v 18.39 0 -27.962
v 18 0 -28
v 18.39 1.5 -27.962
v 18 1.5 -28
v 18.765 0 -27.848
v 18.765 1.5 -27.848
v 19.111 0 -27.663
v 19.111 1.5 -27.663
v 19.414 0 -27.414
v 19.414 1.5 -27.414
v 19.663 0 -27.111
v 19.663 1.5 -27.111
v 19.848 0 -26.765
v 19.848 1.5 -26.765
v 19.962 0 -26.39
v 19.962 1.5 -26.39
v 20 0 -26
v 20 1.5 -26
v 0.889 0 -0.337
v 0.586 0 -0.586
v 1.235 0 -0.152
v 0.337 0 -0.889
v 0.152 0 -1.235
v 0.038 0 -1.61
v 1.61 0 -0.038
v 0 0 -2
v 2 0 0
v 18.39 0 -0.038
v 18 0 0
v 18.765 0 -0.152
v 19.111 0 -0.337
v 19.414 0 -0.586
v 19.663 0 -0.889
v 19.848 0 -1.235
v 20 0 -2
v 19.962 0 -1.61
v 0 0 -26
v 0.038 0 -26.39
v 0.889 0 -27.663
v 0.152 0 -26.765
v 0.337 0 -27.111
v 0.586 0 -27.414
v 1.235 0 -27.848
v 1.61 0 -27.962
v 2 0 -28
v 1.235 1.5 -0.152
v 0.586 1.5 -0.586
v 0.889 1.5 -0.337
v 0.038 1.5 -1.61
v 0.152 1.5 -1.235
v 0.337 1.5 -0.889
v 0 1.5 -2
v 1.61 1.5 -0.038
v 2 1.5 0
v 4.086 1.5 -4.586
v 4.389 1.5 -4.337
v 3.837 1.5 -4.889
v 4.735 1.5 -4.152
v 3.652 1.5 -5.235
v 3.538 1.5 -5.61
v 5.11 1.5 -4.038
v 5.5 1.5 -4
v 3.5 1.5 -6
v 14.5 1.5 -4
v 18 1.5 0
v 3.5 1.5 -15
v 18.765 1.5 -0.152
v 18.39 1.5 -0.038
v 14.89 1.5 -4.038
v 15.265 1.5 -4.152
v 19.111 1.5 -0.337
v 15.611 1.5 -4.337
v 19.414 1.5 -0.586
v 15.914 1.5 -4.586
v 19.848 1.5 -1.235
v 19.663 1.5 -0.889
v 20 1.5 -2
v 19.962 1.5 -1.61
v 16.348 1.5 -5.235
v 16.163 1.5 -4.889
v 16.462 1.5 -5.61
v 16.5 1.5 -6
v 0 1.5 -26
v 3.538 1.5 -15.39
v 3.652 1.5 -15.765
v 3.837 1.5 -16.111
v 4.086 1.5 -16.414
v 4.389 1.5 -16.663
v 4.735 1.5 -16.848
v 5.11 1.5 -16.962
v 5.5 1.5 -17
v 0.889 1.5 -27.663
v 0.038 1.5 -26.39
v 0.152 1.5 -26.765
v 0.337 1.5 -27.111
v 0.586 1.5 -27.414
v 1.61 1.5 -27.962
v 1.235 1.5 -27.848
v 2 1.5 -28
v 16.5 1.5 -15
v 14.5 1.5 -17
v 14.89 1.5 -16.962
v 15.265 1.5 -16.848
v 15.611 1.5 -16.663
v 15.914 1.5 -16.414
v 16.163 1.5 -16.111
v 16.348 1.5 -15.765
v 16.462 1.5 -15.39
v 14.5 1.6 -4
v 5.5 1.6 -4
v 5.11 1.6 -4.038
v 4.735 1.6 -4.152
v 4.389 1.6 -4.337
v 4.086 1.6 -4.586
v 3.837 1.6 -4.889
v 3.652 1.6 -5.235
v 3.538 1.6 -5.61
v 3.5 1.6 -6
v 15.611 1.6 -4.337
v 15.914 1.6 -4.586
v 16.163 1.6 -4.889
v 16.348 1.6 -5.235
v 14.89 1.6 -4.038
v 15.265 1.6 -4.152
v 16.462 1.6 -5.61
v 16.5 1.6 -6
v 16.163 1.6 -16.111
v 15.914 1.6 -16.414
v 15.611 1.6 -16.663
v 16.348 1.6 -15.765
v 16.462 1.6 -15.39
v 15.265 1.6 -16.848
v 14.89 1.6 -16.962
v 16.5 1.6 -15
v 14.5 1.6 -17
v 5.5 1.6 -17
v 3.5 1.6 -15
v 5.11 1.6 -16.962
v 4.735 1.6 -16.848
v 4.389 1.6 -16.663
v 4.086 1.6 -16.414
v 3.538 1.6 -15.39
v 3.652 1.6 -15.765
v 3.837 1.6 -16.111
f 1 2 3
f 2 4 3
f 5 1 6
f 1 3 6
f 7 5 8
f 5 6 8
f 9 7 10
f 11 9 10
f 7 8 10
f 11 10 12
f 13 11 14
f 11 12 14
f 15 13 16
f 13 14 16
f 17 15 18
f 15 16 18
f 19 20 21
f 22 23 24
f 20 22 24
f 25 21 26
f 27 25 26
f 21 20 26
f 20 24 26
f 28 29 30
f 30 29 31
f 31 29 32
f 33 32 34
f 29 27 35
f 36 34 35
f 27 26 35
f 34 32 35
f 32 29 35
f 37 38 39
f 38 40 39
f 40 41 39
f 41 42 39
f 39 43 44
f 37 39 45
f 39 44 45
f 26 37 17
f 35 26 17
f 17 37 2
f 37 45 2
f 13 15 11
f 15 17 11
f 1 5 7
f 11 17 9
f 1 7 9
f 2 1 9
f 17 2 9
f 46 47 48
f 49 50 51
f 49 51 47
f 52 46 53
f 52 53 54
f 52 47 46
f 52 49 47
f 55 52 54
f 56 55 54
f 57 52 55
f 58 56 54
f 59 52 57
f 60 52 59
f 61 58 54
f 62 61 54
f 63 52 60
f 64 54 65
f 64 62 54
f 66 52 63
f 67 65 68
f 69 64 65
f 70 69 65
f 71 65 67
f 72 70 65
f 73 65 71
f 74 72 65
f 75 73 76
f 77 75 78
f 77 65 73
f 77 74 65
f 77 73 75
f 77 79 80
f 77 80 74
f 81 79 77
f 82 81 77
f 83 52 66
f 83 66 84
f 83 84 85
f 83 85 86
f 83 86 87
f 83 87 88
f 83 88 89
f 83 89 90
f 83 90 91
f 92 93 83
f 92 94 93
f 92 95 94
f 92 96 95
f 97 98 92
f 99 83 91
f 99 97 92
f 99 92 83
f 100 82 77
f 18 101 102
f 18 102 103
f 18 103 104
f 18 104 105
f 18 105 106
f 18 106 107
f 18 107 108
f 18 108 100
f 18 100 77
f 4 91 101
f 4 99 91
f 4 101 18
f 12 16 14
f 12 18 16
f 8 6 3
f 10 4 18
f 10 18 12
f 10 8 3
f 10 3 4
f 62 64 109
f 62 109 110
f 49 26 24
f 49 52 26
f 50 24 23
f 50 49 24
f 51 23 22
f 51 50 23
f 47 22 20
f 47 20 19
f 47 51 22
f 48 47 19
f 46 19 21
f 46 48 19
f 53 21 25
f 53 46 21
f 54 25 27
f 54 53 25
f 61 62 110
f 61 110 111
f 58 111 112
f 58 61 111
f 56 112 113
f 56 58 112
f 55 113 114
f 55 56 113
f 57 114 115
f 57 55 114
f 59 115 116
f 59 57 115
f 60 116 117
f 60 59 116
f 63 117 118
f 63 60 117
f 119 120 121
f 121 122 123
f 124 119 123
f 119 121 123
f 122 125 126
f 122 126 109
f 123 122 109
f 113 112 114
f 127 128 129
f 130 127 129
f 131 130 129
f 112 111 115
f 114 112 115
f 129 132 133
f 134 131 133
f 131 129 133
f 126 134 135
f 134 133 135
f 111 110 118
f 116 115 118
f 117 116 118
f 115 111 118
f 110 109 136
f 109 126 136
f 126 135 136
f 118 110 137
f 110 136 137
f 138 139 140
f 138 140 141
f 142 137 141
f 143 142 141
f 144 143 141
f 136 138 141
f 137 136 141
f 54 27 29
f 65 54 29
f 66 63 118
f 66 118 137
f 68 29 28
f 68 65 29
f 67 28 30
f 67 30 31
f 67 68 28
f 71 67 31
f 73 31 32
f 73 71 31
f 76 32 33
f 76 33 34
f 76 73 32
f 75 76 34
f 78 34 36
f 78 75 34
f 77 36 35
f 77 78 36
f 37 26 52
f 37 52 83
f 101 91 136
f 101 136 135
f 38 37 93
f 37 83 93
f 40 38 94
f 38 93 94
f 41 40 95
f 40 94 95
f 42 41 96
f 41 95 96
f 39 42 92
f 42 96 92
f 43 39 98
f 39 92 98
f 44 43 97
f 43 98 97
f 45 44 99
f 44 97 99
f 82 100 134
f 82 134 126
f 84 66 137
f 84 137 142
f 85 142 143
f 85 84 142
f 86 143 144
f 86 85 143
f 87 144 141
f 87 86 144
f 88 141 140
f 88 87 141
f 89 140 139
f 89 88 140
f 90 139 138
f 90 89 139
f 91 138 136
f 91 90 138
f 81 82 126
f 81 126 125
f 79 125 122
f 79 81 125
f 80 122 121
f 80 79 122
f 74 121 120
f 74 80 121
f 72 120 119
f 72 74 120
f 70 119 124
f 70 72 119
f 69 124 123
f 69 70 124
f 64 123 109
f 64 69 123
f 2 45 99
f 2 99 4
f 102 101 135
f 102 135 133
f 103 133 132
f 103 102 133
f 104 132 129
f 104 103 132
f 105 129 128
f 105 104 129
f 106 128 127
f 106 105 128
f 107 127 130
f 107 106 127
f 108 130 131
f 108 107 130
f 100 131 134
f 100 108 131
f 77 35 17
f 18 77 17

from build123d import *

# Parameters (mm, degrees)
SKETCH1_W           = 20
SKETCH1_H           = 28
BOSS_EXTRUDE1_DEPTH = 1.5
BOSS_EXTRUDE2_DEPTH = 0.1
FILLET1_R           = 2


with BuildPart() as part:
    # Sketch1 → Boss-Extrude1 (new body)
    with BuildSketch(Plane(origin=(0, 0, 0), x_dir=(1, 0, 0), z_dir=(0, 1, 0))):
        with Locations((10, 14)):
            Rectangle(SKETCH1_W, SKETCH1_H)
    extrude(amount=BOSS_EXTRUDE1_DEPTH)

    # Sketch2 → Boss-Extrude2 (add)
    with BuildSketch(Plane(origin=(0, 1.5, 0), x_dir=(1, 0, 0), z_dir=(0, 1, 0))):
        with BuildLine():
            Line((5.5, 17), (14.5, 17))
            ThreePointArc((14.5, 17), (15.914213562, 16.414213562), (16.5, 15))
            Line((16.5, 15), (16.5, 6))
            ThreePointArc((16.5, 6), (15.914213562, 4.585786438), (14.5, 4))
            Line((14.5, 4), (5.5, 4))
            ThreePointArc((5.5, 4), (4.085786438, 4.585786438), (3.5, 6))
            Line((3.5, 6), (3.5, 15))
            ThreePointArc((3.5, 15), (4.085786438, 16.414213562), (5.5, 17))
        make_face()
    extrude(amount=BOSS_EXTRUDE2_DEPTH)

    # Fillet1
    fillet1_edges = [part.edges().sort_by_distance(p)[0] for p in [
        (0, 0.75, -28),
        (20, 0.75, -28),
        (20, 0.75, 0),
        (0, 0.75, 0),
    ]]
    fillet(fillet1_edges, radius=FILLET1_R)


solid = part.part
